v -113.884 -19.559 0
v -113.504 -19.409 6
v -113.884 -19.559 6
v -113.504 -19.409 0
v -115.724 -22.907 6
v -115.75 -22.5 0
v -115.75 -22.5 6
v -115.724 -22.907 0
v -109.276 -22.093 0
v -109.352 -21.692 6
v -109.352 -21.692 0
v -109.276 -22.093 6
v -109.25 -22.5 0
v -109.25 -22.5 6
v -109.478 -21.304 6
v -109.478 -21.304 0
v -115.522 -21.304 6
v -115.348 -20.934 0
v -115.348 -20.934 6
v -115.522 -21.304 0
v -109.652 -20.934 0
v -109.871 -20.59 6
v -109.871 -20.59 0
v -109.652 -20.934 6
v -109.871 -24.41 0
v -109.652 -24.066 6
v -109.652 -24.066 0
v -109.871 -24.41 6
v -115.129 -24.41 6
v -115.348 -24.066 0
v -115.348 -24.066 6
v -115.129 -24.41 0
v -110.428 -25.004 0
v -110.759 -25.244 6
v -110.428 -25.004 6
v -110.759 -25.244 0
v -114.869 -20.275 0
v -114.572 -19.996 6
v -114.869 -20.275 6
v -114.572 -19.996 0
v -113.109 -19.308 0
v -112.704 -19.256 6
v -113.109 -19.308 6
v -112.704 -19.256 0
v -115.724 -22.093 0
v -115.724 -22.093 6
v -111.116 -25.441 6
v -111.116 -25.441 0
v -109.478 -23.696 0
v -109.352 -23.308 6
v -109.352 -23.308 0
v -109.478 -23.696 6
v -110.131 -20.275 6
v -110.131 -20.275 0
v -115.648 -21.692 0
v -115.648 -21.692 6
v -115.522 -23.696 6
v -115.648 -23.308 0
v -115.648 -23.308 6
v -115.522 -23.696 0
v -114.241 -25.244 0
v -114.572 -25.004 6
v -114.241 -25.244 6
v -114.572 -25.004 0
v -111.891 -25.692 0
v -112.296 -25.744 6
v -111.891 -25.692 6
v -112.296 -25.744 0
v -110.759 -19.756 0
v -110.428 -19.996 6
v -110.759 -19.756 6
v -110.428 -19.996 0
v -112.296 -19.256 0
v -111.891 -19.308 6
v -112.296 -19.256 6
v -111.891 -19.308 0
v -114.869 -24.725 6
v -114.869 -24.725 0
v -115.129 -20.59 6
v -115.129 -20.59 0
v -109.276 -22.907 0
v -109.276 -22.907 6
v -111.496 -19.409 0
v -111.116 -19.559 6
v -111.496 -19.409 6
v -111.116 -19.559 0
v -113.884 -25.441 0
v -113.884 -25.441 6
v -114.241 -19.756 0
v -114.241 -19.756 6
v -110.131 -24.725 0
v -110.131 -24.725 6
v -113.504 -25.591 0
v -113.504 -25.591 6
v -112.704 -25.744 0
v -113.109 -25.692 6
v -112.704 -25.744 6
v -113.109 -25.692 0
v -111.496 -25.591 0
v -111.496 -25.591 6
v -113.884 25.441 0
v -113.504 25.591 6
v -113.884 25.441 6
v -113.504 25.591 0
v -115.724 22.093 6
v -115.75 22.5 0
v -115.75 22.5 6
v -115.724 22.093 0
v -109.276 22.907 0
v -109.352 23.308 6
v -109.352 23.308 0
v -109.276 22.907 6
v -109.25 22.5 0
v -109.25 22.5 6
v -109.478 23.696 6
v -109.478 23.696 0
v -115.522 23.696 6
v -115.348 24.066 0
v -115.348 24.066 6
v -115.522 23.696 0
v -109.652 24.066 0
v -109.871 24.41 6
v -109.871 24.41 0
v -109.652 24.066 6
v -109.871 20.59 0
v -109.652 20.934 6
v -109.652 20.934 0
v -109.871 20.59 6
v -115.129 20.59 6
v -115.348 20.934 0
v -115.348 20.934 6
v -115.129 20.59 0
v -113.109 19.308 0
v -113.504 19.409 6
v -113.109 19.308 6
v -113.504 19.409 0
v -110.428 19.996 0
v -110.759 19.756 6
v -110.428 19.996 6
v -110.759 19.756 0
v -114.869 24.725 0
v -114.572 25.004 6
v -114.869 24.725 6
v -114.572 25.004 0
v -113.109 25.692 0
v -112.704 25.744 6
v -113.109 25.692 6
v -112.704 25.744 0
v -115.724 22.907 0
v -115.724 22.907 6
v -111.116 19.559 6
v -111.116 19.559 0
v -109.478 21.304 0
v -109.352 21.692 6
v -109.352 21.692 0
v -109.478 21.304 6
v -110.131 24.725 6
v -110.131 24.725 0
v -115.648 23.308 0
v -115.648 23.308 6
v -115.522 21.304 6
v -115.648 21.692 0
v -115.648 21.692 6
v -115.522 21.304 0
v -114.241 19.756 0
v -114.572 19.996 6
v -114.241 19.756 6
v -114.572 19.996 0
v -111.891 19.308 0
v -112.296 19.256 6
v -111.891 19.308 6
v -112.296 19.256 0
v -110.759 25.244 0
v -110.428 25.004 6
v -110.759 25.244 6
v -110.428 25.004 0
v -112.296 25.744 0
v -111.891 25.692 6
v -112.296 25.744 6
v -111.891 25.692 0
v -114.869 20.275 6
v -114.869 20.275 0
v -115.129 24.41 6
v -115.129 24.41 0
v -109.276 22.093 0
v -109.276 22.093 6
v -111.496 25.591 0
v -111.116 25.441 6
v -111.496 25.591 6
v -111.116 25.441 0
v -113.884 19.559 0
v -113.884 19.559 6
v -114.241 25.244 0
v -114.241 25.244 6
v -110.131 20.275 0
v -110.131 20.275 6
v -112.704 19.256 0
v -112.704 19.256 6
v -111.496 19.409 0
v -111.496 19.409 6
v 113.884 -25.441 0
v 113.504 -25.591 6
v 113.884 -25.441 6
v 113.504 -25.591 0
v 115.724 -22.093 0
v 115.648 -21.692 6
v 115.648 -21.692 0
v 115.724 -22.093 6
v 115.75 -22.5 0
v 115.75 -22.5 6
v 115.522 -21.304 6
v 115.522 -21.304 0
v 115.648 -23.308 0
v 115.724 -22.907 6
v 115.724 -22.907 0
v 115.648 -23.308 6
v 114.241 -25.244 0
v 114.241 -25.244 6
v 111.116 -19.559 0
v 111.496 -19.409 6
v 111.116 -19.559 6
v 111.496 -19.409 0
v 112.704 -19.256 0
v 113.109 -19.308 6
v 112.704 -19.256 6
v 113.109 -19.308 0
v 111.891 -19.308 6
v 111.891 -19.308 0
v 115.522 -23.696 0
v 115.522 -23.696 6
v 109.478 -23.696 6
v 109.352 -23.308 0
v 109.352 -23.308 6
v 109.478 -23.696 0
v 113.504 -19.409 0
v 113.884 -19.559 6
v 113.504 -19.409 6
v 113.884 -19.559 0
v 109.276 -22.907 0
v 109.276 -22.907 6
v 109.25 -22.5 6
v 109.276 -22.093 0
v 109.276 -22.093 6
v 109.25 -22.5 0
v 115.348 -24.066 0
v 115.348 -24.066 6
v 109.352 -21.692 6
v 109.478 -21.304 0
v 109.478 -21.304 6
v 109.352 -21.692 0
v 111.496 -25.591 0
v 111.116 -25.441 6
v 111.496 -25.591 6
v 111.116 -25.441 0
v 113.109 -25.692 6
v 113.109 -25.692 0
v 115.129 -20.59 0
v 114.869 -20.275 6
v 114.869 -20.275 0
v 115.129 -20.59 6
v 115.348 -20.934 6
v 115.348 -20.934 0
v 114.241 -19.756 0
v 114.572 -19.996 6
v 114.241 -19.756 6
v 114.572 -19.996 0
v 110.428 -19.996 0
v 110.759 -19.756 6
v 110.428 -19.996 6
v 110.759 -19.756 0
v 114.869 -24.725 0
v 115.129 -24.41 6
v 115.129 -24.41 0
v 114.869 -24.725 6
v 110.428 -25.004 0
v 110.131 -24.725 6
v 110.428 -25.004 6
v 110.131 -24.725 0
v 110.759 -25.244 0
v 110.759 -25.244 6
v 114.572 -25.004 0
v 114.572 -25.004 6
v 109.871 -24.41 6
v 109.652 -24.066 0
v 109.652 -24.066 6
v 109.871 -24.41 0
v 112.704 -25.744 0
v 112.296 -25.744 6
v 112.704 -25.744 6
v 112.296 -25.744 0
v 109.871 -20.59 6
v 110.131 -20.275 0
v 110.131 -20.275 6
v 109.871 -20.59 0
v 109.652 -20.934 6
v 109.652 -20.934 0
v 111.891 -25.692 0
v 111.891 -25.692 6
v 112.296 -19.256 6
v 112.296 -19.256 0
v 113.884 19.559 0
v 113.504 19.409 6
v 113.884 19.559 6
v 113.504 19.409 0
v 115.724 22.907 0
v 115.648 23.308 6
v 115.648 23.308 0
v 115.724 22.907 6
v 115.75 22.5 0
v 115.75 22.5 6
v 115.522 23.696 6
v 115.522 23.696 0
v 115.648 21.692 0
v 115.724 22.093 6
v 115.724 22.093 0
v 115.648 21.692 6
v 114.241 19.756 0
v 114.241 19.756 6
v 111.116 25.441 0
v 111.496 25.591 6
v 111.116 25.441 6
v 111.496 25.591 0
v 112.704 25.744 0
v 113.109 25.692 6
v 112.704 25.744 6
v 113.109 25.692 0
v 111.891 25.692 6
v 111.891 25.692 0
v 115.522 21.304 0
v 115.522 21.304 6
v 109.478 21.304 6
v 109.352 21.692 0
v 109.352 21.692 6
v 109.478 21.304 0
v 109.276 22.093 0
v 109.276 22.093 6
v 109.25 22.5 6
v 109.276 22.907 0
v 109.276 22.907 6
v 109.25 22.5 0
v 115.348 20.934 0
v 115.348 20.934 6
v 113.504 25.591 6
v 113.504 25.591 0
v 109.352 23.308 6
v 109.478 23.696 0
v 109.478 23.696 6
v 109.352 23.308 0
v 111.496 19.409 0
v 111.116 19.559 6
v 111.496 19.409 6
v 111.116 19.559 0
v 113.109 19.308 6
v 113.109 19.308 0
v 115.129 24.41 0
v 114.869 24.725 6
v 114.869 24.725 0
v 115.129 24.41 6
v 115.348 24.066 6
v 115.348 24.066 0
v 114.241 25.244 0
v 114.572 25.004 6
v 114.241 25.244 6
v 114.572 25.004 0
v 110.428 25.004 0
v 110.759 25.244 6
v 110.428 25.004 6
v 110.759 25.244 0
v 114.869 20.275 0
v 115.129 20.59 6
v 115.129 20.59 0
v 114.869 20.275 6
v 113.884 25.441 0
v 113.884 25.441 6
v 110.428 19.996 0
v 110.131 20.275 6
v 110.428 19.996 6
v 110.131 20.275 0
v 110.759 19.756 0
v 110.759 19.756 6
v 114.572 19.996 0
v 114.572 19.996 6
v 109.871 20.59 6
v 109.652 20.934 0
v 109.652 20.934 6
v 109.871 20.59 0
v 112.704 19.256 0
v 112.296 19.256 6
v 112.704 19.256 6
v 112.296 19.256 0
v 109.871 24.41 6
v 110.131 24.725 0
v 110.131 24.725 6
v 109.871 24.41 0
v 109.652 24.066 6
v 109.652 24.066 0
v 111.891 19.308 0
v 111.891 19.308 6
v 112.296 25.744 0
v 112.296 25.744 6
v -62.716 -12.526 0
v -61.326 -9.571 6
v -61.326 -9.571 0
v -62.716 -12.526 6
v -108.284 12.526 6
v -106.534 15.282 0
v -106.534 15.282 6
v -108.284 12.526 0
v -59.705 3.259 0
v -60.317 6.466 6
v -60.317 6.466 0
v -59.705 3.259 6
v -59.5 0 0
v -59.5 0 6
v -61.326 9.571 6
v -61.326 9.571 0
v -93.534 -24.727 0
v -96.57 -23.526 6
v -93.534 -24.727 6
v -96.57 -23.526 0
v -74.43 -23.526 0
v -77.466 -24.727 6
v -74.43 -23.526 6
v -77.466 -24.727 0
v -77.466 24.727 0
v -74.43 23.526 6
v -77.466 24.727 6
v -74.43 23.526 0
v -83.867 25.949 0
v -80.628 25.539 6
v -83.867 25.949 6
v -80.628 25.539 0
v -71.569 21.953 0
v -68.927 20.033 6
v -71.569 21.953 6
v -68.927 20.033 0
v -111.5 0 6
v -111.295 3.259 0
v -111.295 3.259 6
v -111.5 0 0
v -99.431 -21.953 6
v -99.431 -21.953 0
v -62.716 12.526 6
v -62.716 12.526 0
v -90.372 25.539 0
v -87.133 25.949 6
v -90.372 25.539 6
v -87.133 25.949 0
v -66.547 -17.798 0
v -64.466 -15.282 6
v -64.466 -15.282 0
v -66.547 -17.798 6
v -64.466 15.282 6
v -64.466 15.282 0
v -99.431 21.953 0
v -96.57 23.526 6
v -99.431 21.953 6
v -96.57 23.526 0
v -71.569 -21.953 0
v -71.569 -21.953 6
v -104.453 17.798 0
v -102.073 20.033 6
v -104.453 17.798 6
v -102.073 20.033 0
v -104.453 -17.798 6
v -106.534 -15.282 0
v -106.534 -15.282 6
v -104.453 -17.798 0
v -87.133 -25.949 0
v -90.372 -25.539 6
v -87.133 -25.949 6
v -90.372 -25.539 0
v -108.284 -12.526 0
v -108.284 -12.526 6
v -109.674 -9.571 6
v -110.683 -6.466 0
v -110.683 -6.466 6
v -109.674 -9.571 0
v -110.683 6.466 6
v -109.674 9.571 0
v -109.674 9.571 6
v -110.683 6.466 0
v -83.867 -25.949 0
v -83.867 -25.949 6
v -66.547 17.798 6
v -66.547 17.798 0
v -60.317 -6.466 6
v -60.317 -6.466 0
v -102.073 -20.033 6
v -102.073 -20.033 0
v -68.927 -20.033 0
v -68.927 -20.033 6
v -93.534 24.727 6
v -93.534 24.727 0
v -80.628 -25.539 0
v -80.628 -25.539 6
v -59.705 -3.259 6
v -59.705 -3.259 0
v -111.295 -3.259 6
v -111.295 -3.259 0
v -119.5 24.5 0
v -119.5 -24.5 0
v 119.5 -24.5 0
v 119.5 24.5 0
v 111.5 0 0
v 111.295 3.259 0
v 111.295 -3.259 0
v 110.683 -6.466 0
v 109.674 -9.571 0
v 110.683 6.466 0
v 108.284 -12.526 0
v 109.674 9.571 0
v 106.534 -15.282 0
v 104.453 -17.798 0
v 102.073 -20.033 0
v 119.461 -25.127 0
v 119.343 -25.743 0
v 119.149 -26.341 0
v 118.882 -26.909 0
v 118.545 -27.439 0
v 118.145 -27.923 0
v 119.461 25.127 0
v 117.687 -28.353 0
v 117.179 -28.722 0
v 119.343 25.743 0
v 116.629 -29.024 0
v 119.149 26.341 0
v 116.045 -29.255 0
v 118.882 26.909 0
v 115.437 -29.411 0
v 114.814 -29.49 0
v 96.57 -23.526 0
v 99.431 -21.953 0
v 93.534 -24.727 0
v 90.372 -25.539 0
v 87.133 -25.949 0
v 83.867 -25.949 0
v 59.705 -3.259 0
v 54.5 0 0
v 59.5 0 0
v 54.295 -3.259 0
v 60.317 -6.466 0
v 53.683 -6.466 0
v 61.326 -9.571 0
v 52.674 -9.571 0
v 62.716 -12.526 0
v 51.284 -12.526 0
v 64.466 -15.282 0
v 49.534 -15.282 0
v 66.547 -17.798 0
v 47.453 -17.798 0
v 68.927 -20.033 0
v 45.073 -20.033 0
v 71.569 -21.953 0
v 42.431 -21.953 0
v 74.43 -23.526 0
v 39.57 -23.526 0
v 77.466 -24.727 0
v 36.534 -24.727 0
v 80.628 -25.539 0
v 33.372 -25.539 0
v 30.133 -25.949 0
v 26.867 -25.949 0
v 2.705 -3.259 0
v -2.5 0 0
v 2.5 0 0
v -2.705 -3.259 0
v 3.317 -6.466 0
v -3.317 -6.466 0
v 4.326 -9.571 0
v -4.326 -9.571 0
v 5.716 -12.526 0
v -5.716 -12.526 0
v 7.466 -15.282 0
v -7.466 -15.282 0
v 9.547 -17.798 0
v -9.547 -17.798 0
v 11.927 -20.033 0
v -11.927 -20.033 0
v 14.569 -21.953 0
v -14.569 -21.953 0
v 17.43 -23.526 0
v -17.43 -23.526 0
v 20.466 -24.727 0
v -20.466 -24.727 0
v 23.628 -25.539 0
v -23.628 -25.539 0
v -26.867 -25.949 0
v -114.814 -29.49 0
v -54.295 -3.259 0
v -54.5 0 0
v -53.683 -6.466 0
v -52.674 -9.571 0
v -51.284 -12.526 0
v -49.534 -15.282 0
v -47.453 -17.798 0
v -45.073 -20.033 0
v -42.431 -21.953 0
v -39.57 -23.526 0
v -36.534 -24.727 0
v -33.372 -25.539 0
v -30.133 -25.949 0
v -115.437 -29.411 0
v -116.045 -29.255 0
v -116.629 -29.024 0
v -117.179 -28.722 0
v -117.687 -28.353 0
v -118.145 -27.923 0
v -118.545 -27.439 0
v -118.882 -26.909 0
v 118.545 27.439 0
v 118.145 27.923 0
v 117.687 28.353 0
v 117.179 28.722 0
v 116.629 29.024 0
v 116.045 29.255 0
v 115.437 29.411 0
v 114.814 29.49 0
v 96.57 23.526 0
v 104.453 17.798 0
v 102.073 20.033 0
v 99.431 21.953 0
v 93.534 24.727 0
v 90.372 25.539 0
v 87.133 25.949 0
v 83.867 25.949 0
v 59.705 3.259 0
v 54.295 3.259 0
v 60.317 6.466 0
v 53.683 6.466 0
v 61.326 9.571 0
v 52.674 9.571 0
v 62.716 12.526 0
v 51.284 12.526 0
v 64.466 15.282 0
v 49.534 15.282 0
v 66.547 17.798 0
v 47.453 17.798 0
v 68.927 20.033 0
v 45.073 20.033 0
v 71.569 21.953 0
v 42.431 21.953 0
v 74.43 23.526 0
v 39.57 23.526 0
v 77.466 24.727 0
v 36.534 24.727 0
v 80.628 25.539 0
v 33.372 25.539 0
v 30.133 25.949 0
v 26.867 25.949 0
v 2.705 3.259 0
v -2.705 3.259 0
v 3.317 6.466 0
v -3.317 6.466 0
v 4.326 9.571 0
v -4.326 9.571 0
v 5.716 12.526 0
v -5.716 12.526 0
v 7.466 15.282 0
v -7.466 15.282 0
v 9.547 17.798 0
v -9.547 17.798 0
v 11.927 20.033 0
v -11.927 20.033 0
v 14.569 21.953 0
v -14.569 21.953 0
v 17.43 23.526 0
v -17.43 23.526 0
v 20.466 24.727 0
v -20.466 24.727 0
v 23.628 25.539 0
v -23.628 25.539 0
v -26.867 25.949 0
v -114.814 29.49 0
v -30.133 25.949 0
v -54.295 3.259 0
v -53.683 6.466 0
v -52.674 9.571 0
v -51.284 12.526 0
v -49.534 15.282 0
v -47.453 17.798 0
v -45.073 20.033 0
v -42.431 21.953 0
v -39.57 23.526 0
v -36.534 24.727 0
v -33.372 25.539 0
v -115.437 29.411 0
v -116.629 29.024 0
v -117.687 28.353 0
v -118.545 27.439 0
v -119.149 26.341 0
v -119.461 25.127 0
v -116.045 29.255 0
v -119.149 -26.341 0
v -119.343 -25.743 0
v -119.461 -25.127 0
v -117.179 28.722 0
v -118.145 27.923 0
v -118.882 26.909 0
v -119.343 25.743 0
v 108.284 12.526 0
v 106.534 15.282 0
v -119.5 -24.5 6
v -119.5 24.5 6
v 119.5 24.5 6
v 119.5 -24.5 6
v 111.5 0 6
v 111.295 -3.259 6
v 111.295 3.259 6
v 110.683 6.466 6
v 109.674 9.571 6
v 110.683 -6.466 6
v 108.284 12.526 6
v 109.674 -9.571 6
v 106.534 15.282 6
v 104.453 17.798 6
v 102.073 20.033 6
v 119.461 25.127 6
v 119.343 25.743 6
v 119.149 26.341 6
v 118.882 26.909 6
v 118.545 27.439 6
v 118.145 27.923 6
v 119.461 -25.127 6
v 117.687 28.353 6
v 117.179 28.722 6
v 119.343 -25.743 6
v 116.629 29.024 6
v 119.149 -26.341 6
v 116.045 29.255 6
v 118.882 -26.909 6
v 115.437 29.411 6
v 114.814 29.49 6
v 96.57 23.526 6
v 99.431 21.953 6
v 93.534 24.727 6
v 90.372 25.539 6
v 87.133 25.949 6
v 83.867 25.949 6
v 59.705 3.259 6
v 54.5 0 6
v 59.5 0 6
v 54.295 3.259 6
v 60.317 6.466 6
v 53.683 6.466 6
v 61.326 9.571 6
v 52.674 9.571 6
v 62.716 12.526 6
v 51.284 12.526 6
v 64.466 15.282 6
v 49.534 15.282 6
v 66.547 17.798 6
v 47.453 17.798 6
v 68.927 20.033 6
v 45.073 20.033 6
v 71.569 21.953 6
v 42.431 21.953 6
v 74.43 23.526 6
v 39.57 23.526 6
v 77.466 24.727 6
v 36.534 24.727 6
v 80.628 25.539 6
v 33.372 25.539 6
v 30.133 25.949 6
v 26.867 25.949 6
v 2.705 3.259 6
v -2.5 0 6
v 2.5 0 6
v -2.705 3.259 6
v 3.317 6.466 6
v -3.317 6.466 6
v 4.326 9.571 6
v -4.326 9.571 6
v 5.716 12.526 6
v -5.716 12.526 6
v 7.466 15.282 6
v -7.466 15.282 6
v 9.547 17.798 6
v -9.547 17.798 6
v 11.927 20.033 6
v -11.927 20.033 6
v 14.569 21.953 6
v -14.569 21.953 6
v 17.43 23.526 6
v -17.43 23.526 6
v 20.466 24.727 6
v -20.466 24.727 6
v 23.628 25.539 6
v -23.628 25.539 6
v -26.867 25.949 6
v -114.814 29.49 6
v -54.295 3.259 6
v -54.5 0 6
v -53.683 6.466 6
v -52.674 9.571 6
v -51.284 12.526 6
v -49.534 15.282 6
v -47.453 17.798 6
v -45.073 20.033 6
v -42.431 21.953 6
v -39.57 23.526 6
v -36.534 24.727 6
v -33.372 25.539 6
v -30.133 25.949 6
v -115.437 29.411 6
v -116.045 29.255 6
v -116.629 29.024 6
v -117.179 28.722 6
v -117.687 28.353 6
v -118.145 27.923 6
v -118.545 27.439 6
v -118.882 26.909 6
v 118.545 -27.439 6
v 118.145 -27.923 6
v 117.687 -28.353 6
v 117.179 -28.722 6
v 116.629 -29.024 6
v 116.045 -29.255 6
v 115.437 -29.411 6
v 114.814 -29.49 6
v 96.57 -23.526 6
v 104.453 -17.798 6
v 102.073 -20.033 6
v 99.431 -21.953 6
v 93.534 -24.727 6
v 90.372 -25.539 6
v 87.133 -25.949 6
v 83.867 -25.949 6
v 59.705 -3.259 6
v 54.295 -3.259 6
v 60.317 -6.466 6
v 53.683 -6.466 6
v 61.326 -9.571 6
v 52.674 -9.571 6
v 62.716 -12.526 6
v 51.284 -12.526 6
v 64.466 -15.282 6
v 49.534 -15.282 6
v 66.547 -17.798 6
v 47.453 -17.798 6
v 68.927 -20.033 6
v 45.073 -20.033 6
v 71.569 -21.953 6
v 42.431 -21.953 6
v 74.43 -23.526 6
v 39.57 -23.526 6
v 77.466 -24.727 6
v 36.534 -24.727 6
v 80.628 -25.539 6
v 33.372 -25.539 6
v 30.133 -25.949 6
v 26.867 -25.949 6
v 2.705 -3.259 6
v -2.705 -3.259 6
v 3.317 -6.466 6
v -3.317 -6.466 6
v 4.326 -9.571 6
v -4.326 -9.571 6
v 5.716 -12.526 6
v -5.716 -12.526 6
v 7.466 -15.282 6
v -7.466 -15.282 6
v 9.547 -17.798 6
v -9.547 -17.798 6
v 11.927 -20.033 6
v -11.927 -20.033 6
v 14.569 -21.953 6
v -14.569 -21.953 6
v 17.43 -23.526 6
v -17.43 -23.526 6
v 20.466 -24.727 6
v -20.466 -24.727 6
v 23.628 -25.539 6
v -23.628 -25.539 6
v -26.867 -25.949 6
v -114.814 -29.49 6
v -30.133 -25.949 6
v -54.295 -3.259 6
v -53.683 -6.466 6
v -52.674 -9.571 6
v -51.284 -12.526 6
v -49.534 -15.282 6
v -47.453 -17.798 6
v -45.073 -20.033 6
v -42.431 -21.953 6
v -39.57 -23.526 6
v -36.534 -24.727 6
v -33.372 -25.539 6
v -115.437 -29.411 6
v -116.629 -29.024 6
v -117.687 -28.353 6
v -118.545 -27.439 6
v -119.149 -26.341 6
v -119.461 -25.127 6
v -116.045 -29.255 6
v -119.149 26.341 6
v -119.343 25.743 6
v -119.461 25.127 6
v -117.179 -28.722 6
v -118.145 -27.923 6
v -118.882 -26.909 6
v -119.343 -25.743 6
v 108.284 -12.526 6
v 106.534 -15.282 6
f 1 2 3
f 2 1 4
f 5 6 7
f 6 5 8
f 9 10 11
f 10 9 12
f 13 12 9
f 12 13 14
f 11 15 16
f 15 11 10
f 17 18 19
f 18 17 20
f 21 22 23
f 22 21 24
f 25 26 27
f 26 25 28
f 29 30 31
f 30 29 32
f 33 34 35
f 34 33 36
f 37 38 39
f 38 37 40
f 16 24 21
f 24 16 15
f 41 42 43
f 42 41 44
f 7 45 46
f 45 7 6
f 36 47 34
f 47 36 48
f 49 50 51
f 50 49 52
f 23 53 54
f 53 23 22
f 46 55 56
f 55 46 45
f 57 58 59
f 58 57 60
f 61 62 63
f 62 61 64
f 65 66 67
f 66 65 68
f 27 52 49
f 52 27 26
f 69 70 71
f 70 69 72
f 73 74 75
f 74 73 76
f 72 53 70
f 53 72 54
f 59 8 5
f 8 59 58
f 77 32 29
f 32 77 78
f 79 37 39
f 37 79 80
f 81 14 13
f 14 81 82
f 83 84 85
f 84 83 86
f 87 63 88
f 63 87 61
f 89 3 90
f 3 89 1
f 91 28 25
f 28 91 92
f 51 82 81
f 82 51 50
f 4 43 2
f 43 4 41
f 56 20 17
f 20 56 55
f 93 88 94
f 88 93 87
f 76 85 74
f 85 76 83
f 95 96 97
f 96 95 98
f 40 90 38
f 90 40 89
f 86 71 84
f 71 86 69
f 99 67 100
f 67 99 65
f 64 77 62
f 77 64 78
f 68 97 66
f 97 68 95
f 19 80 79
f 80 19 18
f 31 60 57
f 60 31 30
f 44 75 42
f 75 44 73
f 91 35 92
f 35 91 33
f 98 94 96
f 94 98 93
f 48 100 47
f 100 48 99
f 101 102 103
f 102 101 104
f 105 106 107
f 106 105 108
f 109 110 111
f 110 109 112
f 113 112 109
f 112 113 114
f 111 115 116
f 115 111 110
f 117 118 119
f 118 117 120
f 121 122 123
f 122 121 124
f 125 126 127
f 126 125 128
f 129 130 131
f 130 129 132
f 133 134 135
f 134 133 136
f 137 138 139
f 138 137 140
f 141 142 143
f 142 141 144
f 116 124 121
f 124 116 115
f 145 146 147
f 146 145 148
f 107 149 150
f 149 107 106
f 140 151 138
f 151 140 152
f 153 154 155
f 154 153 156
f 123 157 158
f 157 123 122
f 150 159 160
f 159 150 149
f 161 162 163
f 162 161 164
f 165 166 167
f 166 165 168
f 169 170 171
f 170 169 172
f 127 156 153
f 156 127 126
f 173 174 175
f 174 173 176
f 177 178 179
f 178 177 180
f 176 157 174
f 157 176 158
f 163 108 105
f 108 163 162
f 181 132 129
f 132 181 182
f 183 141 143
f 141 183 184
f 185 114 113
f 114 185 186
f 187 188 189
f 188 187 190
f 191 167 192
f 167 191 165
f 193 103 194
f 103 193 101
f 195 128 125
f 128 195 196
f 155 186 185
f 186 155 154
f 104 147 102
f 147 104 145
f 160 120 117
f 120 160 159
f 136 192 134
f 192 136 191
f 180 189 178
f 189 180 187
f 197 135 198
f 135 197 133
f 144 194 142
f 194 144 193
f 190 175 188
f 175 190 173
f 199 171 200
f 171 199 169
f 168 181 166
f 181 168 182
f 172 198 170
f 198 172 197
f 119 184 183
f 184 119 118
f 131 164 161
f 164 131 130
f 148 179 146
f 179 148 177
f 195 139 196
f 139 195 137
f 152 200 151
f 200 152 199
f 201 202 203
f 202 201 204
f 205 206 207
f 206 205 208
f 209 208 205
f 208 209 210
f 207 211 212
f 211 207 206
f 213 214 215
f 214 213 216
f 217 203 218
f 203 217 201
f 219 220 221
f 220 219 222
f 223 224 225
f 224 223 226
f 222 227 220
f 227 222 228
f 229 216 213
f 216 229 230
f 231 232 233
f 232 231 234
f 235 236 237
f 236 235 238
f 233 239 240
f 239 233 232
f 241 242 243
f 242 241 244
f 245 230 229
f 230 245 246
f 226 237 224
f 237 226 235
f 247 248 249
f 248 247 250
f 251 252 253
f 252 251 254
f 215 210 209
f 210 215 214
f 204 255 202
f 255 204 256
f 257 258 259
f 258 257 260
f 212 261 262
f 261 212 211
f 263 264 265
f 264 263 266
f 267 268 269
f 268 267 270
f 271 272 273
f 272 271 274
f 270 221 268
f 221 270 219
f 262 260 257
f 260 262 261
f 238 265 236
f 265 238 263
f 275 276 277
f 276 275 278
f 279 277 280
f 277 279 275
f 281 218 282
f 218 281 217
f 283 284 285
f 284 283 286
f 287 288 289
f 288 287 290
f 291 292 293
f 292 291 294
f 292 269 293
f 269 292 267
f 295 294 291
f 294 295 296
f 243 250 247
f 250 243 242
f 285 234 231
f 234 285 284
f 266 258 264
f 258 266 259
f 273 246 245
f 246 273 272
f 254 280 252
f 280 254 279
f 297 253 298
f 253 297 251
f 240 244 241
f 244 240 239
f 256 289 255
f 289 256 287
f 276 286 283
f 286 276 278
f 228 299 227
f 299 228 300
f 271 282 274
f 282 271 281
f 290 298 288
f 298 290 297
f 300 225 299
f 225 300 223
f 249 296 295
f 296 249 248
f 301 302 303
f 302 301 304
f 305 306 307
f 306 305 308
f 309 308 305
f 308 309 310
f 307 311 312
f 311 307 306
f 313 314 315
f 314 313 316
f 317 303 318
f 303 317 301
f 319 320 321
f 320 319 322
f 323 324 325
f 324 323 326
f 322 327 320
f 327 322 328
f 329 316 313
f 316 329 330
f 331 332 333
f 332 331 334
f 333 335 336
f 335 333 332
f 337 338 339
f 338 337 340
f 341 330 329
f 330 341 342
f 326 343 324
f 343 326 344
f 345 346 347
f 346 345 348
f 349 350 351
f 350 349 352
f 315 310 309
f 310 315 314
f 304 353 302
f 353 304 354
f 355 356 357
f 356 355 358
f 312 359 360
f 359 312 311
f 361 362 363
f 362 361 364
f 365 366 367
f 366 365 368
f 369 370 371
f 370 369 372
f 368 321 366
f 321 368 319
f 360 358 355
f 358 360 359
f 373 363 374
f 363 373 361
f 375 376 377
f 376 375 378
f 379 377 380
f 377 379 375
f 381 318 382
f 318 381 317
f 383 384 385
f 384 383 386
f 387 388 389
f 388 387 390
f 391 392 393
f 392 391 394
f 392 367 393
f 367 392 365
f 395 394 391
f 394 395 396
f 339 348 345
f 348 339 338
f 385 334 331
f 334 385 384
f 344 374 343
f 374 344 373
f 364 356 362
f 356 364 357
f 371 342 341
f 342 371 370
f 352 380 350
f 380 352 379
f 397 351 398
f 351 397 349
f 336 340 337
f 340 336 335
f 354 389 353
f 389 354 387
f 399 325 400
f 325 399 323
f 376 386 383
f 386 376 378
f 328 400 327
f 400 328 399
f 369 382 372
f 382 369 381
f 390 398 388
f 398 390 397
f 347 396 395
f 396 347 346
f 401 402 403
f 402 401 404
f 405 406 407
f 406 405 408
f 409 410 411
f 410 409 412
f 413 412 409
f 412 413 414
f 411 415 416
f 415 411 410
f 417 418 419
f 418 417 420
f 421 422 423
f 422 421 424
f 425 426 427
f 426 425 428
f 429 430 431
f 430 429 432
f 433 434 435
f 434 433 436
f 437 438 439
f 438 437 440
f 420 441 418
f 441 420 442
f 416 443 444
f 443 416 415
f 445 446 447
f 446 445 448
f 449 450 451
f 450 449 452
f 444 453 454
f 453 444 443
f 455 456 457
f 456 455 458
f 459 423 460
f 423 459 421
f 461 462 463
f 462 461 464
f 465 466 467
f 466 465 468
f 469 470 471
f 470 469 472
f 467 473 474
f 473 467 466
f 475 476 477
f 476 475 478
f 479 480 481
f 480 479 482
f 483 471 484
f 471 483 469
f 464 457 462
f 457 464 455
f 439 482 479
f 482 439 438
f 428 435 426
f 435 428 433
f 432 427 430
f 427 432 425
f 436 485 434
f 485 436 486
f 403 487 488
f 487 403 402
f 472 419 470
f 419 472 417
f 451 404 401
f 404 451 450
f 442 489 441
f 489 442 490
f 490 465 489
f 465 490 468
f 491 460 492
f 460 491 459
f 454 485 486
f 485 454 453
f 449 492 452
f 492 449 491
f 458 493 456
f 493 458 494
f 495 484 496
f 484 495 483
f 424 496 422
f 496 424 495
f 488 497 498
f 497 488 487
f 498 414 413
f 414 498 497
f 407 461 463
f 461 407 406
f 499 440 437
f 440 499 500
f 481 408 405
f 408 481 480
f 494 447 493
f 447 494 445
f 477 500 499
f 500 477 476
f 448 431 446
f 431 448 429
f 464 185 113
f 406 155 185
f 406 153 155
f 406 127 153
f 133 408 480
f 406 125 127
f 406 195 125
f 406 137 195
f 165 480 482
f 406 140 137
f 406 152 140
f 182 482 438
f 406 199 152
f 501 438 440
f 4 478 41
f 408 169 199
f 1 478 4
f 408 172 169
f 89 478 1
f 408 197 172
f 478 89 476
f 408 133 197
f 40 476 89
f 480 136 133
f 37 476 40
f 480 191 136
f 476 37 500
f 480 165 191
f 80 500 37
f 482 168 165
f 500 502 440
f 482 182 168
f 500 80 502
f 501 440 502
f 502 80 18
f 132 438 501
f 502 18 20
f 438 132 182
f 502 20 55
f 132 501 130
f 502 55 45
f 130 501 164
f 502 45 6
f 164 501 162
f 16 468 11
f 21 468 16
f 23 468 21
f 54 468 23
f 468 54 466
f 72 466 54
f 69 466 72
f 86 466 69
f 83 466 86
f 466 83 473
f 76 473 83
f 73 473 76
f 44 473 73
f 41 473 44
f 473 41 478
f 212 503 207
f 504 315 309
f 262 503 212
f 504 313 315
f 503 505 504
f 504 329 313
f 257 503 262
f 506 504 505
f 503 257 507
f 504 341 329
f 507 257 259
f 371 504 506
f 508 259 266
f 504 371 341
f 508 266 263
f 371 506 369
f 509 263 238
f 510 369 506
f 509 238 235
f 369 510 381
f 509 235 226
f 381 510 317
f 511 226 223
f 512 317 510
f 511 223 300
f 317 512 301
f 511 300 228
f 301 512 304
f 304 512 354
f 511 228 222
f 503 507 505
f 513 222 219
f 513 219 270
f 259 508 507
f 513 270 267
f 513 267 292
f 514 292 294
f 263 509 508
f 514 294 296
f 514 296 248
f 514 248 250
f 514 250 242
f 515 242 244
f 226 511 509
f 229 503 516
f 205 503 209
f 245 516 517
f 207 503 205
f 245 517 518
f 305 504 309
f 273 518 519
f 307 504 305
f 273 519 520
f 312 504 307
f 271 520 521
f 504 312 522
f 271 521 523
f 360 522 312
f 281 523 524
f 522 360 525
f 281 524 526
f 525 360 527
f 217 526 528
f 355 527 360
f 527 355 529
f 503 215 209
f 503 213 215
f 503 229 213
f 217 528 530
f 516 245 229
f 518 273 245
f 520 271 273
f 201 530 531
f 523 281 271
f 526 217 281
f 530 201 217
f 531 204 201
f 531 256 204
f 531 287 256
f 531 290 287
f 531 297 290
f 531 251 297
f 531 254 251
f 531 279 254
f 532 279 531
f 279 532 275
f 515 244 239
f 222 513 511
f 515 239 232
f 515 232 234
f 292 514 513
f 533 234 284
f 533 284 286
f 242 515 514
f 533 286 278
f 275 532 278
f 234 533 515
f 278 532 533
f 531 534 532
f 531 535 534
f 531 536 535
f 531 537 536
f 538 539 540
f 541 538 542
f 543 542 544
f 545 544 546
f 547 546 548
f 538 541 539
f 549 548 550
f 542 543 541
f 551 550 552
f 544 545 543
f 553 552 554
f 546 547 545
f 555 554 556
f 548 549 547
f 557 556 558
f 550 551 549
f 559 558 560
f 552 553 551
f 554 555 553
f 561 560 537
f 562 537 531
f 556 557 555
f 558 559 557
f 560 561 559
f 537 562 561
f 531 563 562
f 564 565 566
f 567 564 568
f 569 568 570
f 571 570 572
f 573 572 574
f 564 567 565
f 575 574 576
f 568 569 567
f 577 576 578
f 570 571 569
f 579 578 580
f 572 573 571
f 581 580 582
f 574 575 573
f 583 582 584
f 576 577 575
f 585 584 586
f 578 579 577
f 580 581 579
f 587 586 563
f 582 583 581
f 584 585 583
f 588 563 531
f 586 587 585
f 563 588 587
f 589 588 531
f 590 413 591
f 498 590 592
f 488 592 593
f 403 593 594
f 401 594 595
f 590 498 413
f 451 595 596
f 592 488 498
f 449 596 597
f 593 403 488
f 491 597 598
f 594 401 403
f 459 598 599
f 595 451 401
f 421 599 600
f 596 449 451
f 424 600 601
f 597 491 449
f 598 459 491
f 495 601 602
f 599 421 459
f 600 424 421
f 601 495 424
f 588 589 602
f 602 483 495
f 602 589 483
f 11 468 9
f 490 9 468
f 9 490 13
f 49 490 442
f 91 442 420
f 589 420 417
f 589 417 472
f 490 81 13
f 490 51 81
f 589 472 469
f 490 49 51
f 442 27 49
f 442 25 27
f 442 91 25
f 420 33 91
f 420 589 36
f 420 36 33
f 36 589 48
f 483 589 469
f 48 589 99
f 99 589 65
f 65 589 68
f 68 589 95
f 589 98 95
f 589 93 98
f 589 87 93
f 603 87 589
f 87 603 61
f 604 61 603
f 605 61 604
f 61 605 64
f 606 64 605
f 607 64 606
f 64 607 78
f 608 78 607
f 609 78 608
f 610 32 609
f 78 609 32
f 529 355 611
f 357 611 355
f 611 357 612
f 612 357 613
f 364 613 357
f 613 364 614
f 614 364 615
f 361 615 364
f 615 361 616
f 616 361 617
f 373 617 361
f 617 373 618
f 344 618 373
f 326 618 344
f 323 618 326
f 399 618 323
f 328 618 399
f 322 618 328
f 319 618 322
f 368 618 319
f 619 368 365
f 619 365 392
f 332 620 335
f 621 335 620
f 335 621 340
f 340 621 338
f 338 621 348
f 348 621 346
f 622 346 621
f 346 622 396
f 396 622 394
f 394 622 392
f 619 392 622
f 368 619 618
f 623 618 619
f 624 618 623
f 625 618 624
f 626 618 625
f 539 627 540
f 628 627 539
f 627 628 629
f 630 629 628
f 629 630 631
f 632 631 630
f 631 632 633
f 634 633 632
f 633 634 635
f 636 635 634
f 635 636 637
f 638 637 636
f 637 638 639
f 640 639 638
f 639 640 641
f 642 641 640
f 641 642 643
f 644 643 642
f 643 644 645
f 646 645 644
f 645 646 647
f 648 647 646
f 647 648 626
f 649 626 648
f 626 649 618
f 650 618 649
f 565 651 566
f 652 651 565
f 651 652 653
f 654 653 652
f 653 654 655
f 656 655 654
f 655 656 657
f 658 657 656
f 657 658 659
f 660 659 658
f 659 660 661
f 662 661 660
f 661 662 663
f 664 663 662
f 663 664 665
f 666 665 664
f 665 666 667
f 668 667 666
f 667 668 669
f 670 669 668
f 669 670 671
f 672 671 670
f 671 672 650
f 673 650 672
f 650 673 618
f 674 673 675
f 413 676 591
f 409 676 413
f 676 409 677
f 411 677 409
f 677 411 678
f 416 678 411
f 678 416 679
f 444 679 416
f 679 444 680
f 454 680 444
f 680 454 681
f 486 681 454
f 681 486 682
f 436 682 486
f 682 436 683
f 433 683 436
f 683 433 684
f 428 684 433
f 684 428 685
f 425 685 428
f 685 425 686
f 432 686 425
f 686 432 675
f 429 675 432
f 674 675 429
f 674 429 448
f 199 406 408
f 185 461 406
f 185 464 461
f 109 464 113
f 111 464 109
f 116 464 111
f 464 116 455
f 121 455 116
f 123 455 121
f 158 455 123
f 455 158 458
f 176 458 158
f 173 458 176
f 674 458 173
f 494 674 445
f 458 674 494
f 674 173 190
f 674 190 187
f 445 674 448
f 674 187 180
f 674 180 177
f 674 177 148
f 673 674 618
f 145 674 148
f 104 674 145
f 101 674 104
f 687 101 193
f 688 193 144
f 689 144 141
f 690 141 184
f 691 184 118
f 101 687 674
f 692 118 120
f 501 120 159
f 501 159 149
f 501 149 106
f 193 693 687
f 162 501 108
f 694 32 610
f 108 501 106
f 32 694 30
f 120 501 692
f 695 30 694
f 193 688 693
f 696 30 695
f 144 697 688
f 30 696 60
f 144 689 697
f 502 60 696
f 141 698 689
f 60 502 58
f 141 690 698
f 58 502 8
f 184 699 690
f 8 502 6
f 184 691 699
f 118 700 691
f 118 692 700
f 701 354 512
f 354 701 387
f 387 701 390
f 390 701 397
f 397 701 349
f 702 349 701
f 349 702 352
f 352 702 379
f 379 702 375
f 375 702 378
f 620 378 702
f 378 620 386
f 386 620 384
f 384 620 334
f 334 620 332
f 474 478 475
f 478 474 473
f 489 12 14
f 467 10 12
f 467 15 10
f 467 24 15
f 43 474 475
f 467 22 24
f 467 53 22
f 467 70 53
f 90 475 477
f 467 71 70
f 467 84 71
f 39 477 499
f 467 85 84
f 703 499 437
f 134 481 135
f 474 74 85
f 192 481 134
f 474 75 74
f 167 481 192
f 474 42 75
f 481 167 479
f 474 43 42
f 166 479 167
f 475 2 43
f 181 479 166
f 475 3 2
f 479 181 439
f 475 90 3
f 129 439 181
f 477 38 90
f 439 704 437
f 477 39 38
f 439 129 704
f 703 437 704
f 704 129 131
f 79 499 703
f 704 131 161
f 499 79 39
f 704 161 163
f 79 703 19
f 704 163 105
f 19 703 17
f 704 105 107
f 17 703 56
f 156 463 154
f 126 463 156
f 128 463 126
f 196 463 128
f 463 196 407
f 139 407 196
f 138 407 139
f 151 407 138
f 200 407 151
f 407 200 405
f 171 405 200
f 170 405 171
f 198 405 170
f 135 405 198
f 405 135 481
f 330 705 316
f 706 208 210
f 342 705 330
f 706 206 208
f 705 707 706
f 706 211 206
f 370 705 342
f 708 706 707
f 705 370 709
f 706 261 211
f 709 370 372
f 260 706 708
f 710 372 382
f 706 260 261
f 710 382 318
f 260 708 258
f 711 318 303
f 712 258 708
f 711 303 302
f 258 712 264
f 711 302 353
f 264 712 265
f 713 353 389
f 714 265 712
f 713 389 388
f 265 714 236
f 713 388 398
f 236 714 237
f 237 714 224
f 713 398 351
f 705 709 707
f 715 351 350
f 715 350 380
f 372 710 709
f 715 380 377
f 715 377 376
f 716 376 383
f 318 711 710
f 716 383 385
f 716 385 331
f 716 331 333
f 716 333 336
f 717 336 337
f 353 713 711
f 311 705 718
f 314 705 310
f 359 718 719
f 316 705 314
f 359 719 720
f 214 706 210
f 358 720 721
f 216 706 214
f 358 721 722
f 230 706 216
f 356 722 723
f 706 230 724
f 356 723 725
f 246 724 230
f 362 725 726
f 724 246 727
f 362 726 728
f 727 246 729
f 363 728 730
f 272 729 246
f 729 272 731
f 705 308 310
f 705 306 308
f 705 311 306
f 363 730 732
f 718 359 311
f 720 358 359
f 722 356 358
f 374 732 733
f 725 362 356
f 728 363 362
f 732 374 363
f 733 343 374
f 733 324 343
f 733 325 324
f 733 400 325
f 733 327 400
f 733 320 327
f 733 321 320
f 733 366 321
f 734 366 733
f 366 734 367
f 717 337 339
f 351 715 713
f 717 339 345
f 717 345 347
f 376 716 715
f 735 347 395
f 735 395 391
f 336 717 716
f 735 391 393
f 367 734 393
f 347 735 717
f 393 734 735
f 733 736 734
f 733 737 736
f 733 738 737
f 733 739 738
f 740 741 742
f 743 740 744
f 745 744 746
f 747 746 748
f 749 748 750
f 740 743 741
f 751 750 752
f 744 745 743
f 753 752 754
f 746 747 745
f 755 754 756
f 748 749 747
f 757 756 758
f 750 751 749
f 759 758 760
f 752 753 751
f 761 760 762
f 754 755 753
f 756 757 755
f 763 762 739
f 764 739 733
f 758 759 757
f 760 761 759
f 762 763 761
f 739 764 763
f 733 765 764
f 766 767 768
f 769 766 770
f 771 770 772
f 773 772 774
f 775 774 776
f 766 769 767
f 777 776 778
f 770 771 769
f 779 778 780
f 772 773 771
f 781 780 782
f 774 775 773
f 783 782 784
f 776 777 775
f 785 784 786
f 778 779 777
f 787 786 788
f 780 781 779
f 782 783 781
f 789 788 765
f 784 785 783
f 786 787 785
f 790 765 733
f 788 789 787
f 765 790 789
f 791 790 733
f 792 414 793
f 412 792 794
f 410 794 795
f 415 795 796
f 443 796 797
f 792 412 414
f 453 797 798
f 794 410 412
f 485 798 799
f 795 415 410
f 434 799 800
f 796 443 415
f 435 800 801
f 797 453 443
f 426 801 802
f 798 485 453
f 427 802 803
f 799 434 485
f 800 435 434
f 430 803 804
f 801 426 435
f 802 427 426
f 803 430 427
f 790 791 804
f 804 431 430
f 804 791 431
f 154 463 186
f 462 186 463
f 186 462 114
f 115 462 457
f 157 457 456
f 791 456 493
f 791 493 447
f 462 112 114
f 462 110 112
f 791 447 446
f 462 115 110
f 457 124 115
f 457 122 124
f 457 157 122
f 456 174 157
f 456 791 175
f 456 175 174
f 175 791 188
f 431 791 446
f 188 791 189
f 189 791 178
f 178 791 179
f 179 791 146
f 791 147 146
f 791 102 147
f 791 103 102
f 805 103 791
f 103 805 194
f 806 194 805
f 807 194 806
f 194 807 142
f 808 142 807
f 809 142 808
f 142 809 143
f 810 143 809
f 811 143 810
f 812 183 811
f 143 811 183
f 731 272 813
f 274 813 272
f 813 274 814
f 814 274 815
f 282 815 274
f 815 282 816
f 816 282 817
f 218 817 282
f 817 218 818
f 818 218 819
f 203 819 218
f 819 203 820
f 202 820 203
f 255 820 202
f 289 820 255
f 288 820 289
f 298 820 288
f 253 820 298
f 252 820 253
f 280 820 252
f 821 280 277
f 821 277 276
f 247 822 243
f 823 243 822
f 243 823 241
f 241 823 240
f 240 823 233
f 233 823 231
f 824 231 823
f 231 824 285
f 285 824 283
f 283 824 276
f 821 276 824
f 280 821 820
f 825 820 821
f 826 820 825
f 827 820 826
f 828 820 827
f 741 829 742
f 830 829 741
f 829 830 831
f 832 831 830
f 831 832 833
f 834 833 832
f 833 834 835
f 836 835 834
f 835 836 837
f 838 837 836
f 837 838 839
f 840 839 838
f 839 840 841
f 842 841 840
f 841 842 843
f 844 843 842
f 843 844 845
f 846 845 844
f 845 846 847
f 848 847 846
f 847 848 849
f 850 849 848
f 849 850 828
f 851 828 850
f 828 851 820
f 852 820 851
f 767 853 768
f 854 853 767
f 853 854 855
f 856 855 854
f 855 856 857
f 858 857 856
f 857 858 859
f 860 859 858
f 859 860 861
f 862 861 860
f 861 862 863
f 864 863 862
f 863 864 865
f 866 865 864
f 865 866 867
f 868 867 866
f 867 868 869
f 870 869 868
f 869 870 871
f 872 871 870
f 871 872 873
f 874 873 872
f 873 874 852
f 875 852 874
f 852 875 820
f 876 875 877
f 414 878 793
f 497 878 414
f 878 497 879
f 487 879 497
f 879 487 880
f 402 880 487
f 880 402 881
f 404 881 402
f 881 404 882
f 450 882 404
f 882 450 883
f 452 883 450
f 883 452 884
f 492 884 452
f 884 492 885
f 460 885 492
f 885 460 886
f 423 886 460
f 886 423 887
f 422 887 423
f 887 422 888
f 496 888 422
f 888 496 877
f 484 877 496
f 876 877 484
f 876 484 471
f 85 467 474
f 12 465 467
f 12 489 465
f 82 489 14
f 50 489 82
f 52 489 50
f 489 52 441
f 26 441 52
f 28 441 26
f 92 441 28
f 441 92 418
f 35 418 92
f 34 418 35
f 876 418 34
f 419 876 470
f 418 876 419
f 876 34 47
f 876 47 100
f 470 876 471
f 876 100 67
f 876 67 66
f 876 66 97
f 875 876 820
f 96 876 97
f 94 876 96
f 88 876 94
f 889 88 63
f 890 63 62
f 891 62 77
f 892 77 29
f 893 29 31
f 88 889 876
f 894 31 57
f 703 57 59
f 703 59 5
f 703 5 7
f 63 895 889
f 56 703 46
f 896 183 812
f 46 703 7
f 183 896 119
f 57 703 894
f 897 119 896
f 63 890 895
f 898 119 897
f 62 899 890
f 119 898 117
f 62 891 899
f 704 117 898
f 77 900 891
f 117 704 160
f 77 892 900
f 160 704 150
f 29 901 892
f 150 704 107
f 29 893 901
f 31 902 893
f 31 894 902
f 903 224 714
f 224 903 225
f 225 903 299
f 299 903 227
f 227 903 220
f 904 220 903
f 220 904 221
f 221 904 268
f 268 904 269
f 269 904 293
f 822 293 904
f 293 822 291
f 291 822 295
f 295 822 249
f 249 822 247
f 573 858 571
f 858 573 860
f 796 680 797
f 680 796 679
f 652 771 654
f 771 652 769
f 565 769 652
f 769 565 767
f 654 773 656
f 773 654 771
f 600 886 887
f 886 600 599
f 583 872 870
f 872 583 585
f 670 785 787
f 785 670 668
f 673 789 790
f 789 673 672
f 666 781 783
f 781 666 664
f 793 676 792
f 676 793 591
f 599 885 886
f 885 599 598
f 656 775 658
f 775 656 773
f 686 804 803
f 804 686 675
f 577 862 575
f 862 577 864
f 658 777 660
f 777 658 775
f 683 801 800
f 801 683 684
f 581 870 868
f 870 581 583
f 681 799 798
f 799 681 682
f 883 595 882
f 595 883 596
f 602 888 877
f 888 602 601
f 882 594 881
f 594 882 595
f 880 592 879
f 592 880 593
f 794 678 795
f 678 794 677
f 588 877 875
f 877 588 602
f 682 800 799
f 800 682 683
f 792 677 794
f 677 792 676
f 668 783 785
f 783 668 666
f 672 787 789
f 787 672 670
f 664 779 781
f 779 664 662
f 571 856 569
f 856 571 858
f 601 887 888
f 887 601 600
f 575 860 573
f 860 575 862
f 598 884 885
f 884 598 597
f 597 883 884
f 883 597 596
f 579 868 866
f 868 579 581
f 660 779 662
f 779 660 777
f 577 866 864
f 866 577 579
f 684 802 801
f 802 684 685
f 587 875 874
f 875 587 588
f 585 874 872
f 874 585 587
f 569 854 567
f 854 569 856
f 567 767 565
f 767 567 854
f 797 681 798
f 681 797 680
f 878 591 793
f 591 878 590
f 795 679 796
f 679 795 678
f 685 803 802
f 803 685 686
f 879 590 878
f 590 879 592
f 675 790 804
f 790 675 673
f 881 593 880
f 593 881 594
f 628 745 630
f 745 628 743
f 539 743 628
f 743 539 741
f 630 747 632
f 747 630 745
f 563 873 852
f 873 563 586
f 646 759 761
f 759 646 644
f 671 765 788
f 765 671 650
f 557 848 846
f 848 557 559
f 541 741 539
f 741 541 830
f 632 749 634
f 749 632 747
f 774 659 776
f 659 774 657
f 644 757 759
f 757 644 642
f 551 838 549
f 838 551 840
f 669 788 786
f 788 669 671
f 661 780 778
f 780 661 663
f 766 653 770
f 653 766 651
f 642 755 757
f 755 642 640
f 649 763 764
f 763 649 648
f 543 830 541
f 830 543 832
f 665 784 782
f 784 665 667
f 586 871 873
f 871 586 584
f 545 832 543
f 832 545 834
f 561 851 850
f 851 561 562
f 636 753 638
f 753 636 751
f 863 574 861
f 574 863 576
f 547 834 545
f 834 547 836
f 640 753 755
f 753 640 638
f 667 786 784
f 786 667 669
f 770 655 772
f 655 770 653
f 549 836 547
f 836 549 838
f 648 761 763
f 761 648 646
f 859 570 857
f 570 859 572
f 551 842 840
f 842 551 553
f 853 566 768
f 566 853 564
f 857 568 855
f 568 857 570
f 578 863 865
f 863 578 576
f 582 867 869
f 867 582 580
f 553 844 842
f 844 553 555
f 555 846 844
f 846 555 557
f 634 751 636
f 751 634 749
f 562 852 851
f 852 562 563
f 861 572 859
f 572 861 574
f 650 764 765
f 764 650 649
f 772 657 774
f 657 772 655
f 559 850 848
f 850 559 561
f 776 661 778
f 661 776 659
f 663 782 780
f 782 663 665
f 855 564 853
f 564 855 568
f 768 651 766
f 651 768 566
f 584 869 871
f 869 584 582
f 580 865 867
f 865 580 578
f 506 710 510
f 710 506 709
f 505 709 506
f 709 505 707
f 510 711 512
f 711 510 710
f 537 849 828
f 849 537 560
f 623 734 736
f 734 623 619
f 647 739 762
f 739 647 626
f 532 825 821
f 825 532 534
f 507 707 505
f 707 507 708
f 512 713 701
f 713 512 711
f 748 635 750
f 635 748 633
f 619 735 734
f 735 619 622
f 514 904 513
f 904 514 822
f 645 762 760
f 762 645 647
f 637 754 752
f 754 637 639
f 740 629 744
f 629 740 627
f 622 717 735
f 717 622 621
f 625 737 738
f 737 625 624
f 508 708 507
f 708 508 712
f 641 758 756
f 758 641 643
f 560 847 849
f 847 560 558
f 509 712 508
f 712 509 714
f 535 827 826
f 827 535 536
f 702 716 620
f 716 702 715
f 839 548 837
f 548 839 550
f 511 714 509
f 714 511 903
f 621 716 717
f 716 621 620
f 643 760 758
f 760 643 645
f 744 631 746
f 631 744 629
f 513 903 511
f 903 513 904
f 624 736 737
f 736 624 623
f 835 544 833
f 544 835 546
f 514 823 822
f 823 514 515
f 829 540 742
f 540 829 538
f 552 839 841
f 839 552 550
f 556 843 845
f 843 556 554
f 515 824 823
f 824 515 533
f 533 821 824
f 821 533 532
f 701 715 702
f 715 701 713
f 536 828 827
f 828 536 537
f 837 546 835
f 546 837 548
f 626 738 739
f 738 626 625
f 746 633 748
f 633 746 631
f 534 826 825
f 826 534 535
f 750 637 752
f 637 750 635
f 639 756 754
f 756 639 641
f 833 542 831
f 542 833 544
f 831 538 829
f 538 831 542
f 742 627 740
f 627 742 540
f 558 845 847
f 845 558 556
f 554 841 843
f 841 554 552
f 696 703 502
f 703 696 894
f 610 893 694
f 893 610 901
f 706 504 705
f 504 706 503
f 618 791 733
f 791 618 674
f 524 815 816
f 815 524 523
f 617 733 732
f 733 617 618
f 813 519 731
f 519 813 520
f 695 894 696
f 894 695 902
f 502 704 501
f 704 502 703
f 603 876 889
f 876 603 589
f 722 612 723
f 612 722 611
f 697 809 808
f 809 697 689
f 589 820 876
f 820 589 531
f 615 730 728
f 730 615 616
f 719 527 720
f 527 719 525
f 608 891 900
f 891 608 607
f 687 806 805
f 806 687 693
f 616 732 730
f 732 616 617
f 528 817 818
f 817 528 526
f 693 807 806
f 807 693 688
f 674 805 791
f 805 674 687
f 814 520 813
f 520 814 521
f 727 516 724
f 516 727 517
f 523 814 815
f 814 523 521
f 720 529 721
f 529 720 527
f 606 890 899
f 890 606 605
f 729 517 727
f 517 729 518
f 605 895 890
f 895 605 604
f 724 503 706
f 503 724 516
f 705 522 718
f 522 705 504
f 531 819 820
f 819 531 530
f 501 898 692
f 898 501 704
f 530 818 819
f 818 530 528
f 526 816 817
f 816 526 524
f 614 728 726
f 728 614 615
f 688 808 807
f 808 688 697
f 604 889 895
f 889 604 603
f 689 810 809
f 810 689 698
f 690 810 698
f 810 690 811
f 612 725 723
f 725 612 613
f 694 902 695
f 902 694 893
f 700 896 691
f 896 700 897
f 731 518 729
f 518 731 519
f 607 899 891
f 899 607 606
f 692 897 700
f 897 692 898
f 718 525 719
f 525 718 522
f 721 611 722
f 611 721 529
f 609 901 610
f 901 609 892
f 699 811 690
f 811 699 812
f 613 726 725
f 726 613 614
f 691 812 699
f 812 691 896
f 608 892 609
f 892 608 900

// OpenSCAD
$fn = 50;


difference() {
	union() {
		hull() {
			translate(v = [-114.5000000000, 24.5000000000, 0]) {
				cylinder(h = 6, r = 5);
			}
			translate(v = [114.5000000000, 24.5000000000, 0]) {
				cylinder(h = 6, r = 5);
			}
			translate(v = [-114.5000000000, -24.5000000000, 0]) {
				cylinder(h = 6, r = 5);
			}
			translate(v = [114.5000000000, -24.5000000000, 0]) {
				cylinder(h = 6, r = 5);
			}
		}
	}
	union() {
		#translate(v = [-112.5000000000, -22.5000000000, -100.0000000000]) {
			cylinder(h = 200, r = 3.2500000000);
		}
		#translate(v = [-112.5000000000, 22.5000000000, -100.0000000000]) {
			cylinder(h = 200, r = 3.2500000000);
		}
		#translate(v = [112.5000000000, -22.5000000000, -100.0000000000]) {
			cylinder(h = 200, r = 3.2500000000);
		}
		#translate(v = [112.5000000000, 22.5000000000, -100.0000000000]) {
			cylinder(h = 200, r = 3.2500000000);
		}
		#translate(v = [-85.5000000000, 0, 0]) {
			cylinder(h = 6, r = 26.0000000000);
		}
		#translate(v = [-28.5000000000, 0, 0]) {
			cylinder(h = 6, r = 26.0000000000);
		}
		#translate(v = [28.5000000000, 0, 0]) {
			cylinder(h = 6, r = 26.0000000000);
		}
		#translate(v = [85.5000000000, 0, 0]) {
			cylinder(h = 6, r = 26.0000000000);
		}
	}
}
